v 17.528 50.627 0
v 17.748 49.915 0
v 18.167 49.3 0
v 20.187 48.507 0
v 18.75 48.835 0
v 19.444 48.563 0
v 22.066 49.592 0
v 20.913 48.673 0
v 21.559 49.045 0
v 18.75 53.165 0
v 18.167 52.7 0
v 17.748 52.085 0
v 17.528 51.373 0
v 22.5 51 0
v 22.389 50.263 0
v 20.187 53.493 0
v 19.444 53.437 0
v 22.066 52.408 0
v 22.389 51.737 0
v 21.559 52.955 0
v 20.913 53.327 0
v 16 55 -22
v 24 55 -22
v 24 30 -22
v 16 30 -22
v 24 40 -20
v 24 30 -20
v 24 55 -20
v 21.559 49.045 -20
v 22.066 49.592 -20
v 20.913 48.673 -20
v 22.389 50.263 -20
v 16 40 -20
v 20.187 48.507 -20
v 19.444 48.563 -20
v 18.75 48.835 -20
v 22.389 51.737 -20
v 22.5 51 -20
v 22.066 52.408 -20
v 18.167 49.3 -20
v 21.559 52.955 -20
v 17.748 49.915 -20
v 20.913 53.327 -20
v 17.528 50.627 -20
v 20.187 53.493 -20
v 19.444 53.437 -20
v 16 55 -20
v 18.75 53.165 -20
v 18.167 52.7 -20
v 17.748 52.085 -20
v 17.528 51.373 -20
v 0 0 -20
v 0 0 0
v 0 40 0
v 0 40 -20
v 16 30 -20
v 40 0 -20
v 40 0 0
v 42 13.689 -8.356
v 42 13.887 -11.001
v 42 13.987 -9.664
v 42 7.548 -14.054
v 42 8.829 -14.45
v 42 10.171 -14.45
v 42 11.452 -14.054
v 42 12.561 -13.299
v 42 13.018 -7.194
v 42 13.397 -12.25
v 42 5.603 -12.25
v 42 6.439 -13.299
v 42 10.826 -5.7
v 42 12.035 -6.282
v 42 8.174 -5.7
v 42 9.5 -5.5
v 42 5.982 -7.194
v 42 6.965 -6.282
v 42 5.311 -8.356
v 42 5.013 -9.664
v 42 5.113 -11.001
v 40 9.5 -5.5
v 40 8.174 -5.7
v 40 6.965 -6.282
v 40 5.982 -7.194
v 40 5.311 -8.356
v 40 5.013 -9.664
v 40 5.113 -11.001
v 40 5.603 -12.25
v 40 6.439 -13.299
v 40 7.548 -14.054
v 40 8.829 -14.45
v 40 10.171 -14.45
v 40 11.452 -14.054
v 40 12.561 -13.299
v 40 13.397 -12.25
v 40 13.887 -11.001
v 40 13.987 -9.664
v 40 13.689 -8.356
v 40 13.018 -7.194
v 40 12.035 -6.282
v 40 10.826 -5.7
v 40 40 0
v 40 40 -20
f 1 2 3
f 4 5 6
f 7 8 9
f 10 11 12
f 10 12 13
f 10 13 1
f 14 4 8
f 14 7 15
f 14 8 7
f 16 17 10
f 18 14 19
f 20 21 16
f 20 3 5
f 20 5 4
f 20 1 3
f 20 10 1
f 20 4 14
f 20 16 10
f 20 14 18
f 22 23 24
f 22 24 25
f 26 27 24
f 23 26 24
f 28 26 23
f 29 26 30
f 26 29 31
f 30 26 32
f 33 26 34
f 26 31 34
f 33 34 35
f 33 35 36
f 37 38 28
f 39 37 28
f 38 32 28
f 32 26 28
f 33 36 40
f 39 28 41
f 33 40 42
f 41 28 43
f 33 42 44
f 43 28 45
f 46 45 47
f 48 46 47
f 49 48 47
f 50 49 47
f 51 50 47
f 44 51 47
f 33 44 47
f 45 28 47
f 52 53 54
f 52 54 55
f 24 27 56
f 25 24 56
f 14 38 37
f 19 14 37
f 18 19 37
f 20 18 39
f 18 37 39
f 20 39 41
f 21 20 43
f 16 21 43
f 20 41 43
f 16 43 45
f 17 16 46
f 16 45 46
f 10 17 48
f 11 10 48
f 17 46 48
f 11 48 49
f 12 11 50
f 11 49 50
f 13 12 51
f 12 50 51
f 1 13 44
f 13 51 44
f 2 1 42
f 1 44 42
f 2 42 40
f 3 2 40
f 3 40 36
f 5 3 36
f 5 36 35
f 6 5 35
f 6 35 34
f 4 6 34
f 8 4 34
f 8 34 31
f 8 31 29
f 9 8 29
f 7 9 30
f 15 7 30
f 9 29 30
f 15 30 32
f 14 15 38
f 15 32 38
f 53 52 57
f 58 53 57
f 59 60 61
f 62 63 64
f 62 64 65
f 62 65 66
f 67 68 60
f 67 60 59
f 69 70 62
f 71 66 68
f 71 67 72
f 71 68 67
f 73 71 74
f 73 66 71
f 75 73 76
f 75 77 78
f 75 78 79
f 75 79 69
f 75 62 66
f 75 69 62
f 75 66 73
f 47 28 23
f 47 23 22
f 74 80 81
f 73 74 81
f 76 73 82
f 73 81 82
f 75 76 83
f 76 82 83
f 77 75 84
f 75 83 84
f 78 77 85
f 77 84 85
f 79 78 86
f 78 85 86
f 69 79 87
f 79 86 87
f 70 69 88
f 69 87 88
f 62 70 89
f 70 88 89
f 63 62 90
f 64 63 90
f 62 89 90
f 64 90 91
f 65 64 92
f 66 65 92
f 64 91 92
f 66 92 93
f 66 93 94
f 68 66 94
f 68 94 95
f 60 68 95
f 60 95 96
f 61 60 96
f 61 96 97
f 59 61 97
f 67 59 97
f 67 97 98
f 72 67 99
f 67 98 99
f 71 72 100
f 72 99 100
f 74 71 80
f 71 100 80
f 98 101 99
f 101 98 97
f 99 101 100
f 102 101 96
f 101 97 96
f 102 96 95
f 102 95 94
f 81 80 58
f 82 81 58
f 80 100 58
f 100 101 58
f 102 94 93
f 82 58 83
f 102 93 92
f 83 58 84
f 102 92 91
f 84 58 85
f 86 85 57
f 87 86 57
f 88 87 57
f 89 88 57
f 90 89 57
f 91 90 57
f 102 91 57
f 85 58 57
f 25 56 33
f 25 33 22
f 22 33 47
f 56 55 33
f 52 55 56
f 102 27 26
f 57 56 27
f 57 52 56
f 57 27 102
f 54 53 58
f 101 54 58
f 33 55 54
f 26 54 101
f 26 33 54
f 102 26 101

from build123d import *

# Parameters (mm, degrees)
ESQUISSE1_W        = 40
ESQUISSE1_H        = 20
BOSS_EXTRU_1_DEPTH = 40
ESQUISSE2_R        = 4.5
BOSS_EXTRU_2_DEPTH = 2
ESQUISSE3_W        = 8
ESQUISSE3_H        = 25
BOSS_EXTRU_3_DEPTH = 2
ESQUISSE4_R        = 2.5
BOSS_EXTRU_4_DEPTH = 20


with BuildPart() as part:
    # Esquisse1 → Boss.-Extru.1 (new body)
    with BuildSketch(Plane(origin=(0, 0, 0), x_dir=(1, 0, 0), z_dir=(0, 1, 0))):
        with Locations((20, 10)):
            Rectangle(ESQUISSE1_W, ESQUISSE1_H)
    extrude(amount=BOSS_EXTRU_1_DEPTH)

    # Esquisse2 → Boss.-Extru.2 (add)
    with BuildSketch(Plane(origin=(40, 0, 0), x_dir=(0, 0, -1), z_dir=(1, 0, 0))):
        with Locations(Location((10, 9.5, 0), (0, 0, 180))):
            Circle(ESQUISSE2_R)
    extrude(amount=BOSS_EXTRU_2_DEPTH)

    # Esquisse3 → Boss.-Extru.3 (add)
    with BuildSketch(Plane(origin=(0, 0, -20), x_dir=(-1, 0, 0), z_dir=(0, 0, -1))):
        with Locations((-20, 42.5)):
            Rectangle(ESQUISSE3_W, ESQUISSE3_H)
    extrude(amount=BOSS_EXTRU_3_DEPTH)

    # Esquisse4 → Boss.-Extru.4 (add)
    with BuildSketch(Plane.XY.offset(-20)):
        with Locations((20, 51)):
            Circle(ESQUISSE4_R)
    extrude(amount=BOSS_EXTRU_4_DEPTH)


solid = part.part
